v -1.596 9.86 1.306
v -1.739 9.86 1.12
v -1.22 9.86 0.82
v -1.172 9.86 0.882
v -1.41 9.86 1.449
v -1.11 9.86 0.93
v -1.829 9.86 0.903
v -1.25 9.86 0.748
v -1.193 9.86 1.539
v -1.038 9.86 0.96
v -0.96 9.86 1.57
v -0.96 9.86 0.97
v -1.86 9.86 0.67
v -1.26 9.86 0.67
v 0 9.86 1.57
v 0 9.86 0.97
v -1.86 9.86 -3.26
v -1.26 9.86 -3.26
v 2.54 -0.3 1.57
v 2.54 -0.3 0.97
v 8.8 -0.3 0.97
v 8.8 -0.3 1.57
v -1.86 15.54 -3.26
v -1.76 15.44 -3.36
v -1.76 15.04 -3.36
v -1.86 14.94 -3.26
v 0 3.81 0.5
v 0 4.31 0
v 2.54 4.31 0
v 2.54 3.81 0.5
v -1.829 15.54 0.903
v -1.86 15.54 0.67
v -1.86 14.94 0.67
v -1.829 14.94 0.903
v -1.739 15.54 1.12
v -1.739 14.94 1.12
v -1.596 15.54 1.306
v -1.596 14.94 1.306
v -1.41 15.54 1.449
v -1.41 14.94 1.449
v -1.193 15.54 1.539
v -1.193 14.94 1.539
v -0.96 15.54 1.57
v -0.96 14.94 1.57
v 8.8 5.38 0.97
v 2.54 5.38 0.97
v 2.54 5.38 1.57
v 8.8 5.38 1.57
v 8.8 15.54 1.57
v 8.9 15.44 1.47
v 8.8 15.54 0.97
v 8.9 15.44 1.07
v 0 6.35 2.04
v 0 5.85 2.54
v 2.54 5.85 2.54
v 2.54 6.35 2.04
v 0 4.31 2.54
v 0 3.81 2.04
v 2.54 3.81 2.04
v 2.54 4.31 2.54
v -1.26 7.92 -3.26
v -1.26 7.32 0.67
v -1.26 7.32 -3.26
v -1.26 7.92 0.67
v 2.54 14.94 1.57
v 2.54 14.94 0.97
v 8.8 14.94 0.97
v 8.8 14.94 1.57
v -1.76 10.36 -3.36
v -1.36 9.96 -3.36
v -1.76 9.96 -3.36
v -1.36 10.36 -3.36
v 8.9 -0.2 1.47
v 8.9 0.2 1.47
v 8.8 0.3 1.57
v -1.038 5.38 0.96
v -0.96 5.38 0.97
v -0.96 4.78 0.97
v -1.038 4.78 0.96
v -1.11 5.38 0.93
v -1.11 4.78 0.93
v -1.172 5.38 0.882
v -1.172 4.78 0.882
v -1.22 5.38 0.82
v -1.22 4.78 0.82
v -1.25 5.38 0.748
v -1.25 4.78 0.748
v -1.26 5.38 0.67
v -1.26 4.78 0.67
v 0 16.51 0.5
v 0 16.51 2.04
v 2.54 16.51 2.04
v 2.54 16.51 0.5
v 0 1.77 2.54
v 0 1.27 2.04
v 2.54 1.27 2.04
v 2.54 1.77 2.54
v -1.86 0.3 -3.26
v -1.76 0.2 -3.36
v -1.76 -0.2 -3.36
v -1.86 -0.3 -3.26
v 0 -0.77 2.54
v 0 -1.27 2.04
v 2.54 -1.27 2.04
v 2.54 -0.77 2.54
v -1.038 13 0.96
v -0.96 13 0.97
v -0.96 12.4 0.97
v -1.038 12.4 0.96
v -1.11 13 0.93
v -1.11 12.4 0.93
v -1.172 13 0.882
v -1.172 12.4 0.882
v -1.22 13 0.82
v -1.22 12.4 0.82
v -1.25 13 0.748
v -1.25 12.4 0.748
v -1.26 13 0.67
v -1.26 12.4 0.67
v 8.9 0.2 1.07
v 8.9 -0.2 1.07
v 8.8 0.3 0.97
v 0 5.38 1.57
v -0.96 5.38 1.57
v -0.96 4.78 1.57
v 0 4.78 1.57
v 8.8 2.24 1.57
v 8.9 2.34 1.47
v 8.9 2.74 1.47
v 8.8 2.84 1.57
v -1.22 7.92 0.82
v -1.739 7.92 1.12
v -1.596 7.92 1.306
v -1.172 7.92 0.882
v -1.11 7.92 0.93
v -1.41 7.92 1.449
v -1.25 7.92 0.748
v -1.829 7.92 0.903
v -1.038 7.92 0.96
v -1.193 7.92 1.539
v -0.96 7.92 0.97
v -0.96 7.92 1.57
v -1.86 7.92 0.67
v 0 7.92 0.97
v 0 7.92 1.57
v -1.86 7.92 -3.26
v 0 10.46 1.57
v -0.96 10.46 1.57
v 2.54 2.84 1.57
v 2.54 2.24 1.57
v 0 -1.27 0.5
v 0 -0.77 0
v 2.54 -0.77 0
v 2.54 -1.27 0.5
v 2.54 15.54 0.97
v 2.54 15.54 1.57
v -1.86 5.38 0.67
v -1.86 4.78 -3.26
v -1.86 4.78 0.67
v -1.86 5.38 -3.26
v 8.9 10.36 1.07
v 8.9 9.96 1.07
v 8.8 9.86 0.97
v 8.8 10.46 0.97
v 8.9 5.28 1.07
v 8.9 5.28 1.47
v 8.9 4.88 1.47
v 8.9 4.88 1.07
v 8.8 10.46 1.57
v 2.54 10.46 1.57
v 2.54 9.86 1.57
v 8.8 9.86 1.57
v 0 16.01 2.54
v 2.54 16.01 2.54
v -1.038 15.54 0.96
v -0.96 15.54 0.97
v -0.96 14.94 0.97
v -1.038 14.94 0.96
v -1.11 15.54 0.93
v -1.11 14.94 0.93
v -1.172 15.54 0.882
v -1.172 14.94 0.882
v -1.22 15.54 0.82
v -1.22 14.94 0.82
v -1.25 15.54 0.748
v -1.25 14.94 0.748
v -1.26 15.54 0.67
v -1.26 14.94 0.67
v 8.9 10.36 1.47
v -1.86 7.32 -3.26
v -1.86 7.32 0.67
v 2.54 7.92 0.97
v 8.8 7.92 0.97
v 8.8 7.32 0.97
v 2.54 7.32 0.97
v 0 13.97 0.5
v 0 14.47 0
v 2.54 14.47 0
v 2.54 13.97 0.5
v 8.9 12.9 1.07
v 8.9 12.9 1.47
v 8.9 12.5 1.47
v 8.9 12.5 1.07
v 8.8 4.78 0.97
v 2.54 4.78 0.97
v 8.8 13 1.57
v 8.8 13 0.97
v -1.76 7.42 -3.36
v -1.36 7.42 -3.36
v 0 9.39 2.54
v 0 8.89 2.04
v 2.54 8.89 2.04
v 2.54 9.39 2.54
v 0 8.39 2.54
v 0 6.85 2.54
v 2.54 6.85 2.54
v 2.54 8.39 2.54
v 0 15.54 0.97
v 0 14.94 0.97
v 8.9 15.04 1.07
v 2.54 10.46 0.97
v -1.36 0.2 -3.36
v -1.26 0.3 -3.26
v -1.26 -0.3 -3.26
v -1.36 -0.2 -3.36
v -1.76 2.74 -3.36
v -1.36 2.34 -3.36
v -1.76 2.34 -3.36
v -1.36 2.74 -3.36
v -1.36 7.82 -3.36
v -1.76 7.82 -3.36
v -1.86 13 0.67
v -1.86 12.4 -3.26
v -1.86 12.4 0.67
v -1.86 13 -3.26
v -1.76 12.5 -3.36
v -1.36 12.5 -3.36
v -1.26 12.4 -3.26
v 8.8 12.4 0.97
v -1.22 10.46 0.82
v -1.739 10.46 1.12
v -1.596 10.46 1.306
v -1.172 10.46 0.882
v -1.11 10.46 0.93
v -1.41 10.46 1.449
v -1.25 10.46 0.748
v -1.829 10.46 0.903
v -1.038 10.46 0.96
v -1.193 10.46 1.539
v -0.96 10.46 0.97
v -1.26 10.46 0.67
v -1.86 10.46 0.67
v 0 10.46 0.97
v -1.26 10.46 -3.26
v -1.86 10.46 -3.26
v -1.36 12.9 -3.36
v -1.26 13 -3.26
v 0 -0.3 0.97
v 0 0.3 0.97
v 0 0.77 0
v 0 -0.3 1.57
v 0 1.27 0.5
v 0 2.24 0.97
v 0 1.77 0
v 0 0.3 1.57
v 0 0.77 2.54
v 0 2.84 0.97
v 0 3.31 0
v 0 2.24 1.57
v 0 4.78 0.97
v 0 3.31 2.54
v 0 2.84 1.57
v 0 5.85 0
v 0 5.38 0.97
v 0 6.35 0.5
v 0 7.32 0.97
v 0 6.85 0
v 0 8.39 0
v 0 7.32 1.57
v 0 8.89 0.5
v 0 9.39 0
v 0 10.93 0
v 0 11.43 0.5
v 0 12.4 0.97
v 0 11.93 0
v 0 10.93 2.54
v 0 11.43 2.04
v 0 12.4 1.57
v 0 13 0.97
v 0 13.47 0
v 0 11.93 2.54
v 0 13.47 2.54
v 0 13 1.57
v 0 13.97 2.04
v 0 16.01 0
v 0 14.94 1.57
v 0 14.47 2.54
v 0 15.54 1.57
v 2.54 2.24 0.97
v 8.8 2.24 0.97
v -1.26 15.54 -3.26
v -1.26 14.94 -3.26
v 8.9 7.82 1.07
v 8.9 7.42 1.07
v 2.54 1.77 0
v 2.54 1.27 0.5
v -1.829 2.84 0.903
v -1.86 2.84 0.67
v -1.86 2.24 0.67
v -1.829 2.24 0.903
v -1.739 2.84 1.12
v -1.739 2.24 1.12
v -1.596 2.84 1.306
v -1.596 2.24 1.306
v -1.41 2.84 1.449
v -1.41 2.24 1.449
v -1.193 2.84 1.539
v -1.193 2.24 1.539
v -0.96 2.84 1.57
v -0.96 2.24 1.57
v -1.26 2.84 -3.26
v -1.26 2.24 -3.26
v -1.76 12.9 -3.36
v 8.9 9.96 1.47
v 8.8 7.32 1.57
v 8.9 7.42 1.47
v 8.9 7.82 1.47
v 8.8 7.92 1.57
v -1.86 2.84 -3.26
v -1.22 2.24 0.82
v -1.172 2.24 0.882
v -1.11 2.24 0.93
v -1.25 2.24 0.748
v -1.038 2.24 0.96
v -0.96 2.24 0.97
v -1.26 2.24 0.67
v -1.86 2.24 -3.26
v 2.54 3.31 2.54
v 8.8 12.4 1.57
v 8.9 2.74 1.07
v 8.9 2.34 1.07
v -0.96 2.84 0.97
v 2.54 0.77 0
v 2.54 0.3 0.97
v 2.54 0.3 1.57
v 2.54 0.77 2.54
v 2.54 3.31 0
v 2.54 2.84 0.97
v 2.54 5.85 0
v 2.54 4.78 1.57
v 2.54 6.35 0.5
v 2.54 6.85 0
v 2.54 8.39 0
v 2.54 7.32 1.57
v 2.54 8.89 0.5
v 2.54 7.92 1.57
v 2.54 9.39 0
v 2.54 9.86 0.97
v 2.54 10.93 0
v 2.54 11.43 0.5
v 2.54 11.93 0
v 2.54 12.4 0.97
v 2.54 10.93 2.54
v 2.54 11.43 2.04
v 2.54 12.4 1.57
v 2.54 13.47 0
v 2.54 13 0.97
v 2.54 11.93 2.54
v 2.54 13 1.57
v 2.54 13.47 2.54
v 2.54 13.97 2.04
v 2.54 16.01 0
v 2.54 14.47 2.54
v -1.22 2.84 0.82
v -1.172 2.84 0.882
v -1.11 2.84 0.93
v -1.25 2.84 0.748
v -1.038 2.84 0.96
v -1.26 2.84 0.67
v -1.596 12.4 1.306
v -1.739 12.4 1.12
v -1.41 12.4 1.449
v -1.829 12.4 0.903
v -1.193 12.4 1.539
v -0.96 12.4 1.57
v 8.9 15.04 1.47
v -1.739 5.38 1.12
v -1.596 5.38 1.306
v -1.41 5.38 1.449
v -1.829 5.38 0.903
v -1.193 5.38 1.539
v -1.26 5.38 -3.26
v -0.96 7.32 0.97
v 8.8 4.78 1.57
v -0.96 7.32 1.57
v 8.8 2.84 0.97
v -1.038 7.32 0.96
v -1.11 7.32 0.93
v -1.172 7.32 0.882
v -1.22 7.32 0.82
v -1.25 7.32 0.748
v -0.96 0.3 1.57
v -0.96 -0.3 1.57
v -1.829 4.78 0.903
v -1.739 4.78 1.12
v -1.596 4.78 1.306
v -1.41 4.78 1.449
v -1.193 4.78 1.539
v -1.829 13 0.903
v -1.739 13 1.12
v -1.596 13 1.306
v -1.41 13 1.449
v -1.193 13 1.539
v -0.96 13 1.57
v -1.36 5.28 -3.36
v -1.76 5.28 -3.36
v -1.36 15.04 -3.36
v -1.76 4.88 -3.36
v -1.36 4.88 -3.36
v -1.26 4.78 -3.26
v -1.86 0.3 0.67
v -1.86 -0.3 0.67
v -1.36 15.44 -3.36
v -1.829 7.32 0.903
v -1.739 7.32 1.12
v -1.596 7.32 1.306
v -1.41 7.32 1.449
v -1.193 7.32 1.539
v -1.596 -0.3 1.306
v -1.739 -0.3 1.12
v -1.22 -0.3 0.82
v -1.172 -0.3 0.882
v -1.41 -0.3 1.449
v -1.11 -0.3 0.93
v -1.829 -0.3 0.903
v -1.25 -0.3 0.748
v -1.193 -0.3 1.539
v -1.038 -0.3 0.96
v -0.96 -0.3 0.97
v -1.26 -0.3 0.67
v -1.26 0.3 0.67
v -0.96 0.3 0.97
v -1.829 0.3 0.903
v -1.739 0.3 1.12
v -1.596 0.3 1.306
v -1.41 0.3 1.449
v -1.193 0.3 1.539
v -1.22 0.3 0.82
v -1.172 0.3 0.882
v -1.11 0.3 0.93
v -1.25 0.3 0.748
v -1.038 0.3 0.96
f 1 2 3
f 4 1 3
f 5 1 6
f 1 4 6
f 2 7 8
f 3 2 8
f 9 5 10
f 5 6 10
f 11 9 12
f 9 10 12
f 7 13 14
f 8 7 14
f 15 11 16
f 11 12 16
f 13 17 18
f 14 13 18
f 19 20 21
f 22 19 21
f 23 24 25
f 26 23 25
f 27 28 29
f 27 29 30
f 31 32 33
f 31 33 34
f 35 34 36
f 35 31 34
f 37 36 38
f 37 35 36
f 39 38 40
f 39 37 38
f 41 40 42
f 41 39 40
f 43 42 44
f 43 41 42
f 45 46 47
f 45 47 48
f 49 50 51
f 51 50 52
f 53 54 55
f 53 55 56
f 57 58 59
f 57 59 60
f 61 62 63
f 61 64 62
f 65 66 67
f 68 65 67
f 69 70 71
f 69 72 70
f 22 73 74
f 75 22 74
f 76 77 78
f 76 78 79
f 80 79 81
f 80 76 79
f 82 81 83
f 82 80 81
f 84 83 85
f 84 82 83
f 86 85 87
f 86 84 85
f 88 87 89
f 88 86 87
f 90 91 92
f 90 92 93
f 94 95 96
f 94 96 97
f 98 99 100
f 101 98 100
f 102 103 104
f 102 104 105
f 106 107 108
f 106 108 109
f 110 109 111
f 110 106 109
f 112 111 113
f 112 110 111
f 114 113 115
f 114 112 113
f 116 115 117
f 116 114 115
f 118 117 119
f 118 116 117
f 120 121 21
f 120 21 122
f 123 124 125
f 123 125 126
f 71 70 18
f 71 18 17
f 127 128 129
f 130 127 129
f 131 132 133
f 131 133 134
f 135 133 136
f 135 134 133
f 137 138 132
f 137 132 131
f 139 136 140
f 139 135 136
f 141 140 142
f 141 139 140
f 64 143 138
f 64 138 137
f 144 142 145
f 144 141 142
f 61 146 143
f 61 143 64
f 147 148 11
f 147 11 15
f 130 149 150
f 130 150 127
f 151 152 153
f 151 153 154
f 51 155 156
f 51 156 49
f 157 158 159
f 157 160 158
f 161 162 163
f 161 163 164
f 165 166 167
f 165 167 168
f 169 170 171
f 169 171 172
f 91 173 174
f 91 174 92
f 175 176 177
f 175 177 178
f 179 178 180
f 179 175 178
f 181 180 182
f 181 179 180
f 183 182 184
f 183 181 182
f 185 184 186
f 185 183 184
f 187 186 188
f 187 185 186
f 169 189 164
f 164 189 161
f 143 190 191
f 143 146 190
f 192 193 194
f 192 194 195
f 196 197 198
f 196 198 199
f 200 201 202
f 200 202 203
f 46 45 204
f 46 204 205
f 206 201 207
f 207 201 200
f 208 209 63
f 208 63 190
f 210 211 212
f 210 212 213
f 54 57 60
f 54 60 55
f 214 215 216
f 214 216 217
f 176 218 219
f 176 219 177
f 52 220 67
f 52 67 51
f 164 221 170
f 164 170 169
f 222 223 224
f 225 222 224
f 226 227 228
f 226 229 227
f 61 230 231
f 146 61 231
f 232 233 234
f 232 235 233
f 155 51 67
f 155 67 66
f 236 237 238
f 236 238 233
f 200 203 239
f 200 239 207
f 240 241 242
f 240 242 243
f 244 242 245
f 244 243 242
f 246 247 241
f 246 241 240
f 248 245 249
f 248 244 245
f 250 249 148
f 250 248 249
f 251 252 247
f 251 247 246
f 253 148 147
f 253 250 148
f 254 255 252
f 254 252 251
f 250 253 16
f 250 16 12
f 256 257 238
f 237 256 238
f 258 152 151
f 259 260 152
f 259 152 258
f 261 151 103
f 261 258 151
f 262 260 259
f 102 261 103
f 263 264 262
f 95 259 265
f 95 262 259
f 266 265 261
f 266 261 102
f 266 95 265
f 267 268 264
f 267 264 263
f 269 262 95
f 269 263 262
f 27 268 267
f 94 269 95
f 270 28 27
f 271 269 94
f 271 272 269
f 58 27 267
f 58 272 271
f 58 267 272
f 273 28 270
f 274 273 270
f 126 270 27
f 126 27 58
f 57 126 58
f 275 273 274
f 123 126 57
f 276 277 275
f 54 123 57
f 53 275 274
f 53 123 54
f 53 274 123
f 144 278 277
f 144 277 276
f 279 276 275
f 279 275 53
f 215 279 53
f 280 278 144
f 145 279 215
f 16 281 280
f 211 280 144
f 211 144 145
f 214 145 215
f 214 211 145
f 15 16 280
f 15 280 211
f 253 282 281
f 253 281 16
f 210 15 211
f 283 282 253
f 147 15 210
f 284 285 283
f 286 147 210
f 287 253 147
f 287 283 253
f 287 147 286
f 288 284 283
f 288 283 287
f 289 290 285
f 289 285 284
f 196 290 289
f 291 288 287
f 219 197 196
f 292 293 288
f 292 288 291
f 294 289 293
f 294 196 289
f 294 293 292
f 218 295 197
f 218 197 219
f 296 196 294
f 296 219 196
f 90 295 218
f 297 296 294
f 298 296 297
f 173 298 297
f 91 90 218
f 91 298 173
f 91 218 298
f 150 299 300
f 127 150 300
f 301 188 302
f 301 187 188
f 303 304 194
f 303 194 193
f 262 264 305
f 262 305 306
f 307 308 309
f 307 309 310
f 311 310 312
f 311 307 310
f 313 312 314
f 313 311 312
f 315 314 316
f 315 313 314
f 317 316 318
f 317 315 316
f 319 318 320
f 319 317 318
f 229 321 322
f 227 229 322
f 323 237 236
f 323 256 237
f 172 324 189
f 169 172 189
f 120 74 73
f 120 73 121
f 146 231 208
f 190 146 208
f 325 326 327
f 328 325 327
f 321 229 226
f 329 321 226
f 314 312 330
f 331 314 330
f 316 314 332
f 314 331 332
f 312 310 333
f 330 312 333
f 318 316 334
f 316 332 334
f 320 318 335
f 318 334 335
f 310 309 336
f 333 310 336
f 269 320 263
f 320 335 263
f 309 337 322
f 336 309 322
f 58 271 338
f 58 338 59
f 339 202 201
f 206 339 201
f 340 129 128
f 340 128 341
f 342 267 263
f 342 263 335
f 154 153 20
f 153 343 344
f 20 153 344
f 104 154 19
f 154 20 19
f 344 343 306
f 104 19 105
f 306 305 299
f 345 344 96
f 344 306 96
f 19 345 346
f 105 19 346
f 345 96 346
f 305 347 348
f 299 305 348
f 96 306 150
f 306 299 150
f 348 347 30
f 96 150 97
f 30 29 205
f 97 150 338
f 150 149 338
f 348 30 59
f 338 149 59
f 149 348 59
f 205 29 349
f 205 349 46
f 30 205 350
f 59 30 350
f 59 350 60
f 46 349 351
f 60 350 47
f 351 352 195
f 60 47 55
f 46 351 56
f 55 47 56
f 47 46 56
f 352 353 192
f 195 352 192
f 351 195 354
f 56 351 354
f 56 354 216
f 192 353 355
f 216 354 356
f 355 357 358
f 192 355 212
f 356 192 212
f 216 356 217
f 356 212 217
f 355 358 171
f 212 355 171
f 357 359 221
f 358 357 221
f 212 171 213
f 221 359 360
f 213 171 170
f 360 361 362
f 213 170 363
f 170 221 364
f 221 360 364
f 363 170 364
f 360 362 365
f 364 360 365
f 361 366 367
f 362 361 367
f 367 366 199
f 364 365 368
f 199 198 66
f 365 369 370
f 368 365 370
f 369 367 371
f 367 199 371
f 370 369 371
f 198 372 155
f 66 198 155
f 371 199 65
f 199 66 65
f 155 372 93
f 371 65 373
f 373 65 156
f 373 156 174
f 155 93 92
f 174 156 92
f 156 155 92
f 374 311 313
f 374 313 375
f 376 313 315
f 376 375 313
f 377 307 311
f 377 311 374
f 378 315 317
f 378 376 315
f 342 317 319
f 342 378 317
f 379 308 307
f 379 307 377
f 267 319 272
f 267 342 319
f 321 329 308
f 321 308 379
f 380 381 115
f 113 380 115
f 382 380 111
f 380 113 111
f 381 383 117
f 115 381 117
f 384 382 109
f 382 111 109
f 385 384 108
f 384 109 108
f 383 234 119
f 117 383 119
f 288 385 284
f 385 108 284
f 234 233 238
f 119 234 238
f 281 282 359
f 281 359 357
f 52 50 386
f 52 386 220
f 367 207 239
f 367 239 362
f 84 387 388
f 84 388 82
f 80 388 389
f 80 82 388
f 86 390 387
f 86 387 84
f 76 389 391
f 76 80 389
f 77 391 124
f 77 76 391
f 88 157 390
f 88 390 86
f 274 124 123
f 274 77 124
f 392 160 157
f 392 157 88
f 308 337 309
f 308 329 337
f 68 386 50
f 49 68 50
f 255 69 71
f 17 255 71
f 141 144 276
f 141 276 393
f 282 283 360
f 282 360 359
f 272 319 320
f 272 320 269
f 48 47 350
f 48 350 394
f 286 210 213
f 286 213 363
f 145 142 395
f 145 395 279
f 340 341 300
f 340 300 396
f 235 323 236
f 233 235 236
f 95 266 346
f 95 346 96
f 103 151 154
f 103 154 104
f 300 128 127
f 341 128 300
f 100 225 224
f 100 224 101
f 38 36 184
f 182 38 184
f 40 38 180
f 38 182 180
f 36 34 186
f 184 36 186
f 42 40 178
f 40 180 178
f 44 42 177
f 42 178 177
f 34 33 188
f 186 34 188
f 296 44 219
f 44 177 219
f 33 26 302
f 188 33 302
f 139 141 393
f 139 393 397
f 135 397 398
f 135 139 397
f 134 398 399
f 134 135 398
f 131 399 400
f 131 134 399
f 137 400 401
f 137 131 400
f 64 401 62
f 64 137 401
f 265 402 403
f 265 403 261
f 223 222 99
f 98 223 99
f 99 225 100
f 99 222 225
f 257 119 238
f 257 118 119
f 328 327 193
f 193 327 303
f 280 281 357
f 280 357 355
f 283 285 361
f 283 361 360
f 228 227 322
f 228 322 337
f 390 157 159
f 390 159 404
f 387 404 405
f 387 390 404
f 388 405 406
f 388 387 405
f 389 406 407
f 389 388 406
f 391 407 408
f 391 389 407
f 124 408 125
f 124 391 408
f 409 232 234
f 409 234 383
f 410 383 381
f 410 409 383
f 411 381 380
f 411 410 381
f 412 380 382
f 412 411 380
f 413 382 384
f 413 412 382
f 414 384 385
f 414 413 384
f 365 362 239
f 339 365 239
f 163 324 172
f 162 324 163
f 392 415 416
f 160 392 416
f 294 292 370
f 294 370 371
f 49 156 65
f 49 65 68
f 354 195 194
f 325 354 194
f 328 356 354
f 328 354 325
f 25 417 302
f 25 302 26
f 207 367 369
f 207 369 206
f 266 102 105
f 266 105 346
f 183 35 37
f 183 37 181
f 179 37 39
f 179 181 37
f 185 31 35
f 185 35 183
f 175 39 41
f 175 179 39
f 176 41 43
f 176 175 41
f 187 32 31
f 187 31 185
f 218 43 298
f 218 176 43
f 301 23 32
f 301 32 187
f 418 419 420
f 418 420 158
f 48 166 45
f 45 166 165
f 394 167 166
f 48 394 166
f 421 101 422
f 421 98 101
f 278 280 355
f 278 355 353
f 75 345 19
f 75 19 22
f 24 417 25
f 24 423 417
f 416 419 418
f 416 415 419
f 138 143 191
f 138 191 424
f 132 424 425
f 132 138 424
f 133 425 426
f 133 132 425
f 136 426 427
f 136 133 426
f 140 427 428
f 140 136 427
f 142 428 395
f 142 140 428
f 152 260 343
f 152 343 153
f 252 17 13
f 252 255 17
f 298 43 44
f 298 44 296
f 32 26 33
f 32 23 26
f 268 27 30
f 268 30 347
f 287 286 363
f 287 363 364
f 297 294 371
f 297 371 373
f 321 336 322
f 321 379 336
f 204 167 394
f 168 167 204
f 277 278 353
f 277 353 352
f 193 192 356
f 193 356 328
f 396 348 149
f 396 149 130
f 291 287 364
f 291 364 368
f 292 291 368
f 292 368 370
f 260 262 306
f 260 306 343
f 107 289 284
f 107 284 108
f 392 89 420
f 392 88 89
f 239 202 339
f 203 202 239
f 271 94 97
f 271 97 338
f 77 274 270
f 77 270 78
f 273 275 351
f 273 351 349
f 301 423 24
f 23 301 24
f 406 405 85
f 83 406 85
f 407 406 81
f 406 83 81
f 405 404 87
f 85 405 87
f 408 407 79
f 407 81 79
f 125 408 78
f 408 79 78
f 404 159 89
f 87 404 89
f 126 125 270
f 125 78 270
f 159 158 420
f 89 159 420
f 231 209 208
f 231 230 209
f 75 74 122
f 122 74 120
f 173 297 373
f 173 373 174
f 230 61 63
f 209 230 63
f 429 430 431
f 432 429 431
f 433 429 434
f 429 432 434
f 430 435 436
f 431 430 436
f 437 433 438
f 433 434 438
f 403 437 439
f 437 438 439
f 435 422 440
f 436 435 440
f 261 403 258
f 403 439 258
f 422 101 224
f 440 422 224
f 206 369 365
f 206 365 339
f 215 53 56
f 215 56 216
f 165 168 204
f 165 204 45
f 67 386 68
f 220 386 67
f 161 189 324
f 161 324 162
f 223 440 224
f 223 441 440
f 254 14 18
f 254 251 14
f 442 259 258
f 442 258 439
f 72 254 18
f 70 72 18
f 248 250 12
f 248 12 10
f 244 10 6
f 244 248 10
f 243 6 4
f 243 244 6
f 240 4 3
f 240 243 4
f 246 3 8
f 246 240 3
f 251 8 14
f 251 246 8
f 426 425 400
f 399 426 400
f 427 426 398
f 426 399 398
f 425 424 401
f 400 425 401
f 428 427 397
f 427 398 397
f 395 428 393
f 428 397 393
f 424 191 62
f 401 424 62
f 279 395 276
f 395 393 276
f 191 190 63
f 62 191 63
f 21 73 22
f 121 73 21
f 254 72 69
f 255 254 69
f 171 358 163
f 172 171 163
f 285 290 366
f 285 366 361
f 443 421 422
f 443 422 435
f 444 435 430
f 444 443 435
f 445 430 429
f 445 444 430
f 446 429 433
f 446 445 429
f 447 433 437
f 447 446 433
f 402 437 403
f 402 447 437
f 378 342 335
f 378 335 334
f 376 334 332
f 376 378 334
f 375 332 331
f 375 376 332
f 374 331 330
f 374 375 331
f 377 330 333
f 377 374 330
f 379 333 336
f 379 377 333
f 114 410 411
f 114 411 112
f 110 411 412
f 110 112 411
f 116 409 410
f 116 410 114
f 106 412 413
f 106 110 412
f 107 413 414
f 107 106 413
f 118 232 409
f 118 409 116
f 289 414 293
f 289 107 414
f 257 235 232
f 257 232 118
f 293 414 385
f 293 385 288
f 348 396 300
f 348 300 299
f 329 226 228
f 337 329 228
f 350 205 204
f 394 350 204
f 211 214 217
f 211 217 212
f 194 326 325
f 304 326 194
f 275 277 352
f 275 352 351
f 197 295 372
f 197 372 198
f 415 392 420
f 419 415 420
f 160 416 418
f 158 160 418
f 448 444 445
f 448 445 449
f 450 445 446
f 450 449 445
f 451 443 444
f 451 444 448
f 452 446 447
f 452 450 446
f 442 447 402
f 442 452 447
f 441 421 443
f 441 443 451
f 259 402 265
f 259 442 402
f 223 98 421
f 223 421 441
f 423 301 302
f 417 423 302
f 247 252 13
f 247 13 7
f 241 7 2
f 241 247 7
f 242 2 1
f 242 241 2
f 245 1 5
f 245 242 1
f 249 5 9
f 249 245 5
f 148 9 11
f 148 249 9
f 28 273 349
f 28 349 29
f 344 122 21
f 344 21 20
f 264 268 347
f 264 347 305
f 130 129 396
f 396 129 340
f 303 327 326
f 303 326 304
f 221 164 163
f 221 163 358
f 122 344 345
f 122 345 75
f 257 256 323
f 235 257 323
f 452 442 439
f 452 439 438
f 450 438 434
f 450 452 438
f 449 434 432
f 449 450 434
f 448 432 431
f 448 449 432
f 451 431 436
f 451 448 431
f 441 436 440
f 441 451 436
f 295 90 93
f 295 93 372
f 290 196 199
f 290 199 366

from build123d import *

# Parameters (mm, degrees)
PLASTIC_DEPTH   = 2.54
CONTACT_DEPTH   = 0.3
CHAMFER1_SIZE   = 0.1
LPATTERN1_COUNT = 7
LPATTERN1_PITCH = 2.54


with BuildPart() as part:
    # Sketch1 → Plastic (new body)
    with BuildSketch(Plane(origin=(0, 0, 0), x_dir=(0, 0, -1), z_dir=(1, 0, 0))):
        Polygon((-2.04, 1.27), (-0.5, 1.27), (0, 0.77), (0, -0.77), (-0.5, -1.27), (-2.04, -1.27), (-2.54, -0.77), (-2.54, 0.77), align=None)
    extrude(amount=PLASTIC_DEPTH)

    # Sketch2 → Contact (add, symmetric)
    with BuildSketch(Plane(origin=(0, 0, 0), x_dir=(1, 0, 0), z_dir=(0, 1, 0))):
        with BuildLine():
            Line((-1.86, 3.36), (-1.86, -0.67))
            ThreePointArc((-1.86, -0.67), (-1.596396103, -1.306396103), (-0.96, -1.57))
            Line((-0.96, -1.57), (8.9, -1.57))
            Line((8.9, -1.57), (8.9, -0.97))
            Line((8.9, -0.97), (-0.96, -0.97))
            ThreePointArc((-0.96, -0.97), (-1.172132034, -0.882132034), (-1.26, -0.67))
            Line((-1.26, -0.67), (-1.26, 3.36))
            Line((-1.26, 3.36), (-1.86, 3.36))
        make_face()
    extrude(amount=CONTACT_DEPTH, both=True)

    # Chamfer1
    chamfer1_edges = [part.edges().sort_by_distance(p)[0] for p in [
        (8.9, 0, 0.97),
        (8.9, 0.3, 1.27),
        (-1.56, -0.3, -3.36),
        (-1.26, 0, -3.36),
        (-1.86, 0, -3.36),
        (8.9, -0.3, 1.27),
        (8.9, 0, 1.57),
        (-1.56, 0.3, -3.36),
    ]]
    chamfer(chamfer1_edges, length=CHAMFER1_SIZE)

    # LPattern1: part ×7


with BuildPart() as part_1:
    add(part.part)
    with Locations(*[(0, i * LPATTERN1_PITCH, 0) for i in range(1, LPATTERN1_COUNT)]):
        add(part.part)


solid = part_1.part
